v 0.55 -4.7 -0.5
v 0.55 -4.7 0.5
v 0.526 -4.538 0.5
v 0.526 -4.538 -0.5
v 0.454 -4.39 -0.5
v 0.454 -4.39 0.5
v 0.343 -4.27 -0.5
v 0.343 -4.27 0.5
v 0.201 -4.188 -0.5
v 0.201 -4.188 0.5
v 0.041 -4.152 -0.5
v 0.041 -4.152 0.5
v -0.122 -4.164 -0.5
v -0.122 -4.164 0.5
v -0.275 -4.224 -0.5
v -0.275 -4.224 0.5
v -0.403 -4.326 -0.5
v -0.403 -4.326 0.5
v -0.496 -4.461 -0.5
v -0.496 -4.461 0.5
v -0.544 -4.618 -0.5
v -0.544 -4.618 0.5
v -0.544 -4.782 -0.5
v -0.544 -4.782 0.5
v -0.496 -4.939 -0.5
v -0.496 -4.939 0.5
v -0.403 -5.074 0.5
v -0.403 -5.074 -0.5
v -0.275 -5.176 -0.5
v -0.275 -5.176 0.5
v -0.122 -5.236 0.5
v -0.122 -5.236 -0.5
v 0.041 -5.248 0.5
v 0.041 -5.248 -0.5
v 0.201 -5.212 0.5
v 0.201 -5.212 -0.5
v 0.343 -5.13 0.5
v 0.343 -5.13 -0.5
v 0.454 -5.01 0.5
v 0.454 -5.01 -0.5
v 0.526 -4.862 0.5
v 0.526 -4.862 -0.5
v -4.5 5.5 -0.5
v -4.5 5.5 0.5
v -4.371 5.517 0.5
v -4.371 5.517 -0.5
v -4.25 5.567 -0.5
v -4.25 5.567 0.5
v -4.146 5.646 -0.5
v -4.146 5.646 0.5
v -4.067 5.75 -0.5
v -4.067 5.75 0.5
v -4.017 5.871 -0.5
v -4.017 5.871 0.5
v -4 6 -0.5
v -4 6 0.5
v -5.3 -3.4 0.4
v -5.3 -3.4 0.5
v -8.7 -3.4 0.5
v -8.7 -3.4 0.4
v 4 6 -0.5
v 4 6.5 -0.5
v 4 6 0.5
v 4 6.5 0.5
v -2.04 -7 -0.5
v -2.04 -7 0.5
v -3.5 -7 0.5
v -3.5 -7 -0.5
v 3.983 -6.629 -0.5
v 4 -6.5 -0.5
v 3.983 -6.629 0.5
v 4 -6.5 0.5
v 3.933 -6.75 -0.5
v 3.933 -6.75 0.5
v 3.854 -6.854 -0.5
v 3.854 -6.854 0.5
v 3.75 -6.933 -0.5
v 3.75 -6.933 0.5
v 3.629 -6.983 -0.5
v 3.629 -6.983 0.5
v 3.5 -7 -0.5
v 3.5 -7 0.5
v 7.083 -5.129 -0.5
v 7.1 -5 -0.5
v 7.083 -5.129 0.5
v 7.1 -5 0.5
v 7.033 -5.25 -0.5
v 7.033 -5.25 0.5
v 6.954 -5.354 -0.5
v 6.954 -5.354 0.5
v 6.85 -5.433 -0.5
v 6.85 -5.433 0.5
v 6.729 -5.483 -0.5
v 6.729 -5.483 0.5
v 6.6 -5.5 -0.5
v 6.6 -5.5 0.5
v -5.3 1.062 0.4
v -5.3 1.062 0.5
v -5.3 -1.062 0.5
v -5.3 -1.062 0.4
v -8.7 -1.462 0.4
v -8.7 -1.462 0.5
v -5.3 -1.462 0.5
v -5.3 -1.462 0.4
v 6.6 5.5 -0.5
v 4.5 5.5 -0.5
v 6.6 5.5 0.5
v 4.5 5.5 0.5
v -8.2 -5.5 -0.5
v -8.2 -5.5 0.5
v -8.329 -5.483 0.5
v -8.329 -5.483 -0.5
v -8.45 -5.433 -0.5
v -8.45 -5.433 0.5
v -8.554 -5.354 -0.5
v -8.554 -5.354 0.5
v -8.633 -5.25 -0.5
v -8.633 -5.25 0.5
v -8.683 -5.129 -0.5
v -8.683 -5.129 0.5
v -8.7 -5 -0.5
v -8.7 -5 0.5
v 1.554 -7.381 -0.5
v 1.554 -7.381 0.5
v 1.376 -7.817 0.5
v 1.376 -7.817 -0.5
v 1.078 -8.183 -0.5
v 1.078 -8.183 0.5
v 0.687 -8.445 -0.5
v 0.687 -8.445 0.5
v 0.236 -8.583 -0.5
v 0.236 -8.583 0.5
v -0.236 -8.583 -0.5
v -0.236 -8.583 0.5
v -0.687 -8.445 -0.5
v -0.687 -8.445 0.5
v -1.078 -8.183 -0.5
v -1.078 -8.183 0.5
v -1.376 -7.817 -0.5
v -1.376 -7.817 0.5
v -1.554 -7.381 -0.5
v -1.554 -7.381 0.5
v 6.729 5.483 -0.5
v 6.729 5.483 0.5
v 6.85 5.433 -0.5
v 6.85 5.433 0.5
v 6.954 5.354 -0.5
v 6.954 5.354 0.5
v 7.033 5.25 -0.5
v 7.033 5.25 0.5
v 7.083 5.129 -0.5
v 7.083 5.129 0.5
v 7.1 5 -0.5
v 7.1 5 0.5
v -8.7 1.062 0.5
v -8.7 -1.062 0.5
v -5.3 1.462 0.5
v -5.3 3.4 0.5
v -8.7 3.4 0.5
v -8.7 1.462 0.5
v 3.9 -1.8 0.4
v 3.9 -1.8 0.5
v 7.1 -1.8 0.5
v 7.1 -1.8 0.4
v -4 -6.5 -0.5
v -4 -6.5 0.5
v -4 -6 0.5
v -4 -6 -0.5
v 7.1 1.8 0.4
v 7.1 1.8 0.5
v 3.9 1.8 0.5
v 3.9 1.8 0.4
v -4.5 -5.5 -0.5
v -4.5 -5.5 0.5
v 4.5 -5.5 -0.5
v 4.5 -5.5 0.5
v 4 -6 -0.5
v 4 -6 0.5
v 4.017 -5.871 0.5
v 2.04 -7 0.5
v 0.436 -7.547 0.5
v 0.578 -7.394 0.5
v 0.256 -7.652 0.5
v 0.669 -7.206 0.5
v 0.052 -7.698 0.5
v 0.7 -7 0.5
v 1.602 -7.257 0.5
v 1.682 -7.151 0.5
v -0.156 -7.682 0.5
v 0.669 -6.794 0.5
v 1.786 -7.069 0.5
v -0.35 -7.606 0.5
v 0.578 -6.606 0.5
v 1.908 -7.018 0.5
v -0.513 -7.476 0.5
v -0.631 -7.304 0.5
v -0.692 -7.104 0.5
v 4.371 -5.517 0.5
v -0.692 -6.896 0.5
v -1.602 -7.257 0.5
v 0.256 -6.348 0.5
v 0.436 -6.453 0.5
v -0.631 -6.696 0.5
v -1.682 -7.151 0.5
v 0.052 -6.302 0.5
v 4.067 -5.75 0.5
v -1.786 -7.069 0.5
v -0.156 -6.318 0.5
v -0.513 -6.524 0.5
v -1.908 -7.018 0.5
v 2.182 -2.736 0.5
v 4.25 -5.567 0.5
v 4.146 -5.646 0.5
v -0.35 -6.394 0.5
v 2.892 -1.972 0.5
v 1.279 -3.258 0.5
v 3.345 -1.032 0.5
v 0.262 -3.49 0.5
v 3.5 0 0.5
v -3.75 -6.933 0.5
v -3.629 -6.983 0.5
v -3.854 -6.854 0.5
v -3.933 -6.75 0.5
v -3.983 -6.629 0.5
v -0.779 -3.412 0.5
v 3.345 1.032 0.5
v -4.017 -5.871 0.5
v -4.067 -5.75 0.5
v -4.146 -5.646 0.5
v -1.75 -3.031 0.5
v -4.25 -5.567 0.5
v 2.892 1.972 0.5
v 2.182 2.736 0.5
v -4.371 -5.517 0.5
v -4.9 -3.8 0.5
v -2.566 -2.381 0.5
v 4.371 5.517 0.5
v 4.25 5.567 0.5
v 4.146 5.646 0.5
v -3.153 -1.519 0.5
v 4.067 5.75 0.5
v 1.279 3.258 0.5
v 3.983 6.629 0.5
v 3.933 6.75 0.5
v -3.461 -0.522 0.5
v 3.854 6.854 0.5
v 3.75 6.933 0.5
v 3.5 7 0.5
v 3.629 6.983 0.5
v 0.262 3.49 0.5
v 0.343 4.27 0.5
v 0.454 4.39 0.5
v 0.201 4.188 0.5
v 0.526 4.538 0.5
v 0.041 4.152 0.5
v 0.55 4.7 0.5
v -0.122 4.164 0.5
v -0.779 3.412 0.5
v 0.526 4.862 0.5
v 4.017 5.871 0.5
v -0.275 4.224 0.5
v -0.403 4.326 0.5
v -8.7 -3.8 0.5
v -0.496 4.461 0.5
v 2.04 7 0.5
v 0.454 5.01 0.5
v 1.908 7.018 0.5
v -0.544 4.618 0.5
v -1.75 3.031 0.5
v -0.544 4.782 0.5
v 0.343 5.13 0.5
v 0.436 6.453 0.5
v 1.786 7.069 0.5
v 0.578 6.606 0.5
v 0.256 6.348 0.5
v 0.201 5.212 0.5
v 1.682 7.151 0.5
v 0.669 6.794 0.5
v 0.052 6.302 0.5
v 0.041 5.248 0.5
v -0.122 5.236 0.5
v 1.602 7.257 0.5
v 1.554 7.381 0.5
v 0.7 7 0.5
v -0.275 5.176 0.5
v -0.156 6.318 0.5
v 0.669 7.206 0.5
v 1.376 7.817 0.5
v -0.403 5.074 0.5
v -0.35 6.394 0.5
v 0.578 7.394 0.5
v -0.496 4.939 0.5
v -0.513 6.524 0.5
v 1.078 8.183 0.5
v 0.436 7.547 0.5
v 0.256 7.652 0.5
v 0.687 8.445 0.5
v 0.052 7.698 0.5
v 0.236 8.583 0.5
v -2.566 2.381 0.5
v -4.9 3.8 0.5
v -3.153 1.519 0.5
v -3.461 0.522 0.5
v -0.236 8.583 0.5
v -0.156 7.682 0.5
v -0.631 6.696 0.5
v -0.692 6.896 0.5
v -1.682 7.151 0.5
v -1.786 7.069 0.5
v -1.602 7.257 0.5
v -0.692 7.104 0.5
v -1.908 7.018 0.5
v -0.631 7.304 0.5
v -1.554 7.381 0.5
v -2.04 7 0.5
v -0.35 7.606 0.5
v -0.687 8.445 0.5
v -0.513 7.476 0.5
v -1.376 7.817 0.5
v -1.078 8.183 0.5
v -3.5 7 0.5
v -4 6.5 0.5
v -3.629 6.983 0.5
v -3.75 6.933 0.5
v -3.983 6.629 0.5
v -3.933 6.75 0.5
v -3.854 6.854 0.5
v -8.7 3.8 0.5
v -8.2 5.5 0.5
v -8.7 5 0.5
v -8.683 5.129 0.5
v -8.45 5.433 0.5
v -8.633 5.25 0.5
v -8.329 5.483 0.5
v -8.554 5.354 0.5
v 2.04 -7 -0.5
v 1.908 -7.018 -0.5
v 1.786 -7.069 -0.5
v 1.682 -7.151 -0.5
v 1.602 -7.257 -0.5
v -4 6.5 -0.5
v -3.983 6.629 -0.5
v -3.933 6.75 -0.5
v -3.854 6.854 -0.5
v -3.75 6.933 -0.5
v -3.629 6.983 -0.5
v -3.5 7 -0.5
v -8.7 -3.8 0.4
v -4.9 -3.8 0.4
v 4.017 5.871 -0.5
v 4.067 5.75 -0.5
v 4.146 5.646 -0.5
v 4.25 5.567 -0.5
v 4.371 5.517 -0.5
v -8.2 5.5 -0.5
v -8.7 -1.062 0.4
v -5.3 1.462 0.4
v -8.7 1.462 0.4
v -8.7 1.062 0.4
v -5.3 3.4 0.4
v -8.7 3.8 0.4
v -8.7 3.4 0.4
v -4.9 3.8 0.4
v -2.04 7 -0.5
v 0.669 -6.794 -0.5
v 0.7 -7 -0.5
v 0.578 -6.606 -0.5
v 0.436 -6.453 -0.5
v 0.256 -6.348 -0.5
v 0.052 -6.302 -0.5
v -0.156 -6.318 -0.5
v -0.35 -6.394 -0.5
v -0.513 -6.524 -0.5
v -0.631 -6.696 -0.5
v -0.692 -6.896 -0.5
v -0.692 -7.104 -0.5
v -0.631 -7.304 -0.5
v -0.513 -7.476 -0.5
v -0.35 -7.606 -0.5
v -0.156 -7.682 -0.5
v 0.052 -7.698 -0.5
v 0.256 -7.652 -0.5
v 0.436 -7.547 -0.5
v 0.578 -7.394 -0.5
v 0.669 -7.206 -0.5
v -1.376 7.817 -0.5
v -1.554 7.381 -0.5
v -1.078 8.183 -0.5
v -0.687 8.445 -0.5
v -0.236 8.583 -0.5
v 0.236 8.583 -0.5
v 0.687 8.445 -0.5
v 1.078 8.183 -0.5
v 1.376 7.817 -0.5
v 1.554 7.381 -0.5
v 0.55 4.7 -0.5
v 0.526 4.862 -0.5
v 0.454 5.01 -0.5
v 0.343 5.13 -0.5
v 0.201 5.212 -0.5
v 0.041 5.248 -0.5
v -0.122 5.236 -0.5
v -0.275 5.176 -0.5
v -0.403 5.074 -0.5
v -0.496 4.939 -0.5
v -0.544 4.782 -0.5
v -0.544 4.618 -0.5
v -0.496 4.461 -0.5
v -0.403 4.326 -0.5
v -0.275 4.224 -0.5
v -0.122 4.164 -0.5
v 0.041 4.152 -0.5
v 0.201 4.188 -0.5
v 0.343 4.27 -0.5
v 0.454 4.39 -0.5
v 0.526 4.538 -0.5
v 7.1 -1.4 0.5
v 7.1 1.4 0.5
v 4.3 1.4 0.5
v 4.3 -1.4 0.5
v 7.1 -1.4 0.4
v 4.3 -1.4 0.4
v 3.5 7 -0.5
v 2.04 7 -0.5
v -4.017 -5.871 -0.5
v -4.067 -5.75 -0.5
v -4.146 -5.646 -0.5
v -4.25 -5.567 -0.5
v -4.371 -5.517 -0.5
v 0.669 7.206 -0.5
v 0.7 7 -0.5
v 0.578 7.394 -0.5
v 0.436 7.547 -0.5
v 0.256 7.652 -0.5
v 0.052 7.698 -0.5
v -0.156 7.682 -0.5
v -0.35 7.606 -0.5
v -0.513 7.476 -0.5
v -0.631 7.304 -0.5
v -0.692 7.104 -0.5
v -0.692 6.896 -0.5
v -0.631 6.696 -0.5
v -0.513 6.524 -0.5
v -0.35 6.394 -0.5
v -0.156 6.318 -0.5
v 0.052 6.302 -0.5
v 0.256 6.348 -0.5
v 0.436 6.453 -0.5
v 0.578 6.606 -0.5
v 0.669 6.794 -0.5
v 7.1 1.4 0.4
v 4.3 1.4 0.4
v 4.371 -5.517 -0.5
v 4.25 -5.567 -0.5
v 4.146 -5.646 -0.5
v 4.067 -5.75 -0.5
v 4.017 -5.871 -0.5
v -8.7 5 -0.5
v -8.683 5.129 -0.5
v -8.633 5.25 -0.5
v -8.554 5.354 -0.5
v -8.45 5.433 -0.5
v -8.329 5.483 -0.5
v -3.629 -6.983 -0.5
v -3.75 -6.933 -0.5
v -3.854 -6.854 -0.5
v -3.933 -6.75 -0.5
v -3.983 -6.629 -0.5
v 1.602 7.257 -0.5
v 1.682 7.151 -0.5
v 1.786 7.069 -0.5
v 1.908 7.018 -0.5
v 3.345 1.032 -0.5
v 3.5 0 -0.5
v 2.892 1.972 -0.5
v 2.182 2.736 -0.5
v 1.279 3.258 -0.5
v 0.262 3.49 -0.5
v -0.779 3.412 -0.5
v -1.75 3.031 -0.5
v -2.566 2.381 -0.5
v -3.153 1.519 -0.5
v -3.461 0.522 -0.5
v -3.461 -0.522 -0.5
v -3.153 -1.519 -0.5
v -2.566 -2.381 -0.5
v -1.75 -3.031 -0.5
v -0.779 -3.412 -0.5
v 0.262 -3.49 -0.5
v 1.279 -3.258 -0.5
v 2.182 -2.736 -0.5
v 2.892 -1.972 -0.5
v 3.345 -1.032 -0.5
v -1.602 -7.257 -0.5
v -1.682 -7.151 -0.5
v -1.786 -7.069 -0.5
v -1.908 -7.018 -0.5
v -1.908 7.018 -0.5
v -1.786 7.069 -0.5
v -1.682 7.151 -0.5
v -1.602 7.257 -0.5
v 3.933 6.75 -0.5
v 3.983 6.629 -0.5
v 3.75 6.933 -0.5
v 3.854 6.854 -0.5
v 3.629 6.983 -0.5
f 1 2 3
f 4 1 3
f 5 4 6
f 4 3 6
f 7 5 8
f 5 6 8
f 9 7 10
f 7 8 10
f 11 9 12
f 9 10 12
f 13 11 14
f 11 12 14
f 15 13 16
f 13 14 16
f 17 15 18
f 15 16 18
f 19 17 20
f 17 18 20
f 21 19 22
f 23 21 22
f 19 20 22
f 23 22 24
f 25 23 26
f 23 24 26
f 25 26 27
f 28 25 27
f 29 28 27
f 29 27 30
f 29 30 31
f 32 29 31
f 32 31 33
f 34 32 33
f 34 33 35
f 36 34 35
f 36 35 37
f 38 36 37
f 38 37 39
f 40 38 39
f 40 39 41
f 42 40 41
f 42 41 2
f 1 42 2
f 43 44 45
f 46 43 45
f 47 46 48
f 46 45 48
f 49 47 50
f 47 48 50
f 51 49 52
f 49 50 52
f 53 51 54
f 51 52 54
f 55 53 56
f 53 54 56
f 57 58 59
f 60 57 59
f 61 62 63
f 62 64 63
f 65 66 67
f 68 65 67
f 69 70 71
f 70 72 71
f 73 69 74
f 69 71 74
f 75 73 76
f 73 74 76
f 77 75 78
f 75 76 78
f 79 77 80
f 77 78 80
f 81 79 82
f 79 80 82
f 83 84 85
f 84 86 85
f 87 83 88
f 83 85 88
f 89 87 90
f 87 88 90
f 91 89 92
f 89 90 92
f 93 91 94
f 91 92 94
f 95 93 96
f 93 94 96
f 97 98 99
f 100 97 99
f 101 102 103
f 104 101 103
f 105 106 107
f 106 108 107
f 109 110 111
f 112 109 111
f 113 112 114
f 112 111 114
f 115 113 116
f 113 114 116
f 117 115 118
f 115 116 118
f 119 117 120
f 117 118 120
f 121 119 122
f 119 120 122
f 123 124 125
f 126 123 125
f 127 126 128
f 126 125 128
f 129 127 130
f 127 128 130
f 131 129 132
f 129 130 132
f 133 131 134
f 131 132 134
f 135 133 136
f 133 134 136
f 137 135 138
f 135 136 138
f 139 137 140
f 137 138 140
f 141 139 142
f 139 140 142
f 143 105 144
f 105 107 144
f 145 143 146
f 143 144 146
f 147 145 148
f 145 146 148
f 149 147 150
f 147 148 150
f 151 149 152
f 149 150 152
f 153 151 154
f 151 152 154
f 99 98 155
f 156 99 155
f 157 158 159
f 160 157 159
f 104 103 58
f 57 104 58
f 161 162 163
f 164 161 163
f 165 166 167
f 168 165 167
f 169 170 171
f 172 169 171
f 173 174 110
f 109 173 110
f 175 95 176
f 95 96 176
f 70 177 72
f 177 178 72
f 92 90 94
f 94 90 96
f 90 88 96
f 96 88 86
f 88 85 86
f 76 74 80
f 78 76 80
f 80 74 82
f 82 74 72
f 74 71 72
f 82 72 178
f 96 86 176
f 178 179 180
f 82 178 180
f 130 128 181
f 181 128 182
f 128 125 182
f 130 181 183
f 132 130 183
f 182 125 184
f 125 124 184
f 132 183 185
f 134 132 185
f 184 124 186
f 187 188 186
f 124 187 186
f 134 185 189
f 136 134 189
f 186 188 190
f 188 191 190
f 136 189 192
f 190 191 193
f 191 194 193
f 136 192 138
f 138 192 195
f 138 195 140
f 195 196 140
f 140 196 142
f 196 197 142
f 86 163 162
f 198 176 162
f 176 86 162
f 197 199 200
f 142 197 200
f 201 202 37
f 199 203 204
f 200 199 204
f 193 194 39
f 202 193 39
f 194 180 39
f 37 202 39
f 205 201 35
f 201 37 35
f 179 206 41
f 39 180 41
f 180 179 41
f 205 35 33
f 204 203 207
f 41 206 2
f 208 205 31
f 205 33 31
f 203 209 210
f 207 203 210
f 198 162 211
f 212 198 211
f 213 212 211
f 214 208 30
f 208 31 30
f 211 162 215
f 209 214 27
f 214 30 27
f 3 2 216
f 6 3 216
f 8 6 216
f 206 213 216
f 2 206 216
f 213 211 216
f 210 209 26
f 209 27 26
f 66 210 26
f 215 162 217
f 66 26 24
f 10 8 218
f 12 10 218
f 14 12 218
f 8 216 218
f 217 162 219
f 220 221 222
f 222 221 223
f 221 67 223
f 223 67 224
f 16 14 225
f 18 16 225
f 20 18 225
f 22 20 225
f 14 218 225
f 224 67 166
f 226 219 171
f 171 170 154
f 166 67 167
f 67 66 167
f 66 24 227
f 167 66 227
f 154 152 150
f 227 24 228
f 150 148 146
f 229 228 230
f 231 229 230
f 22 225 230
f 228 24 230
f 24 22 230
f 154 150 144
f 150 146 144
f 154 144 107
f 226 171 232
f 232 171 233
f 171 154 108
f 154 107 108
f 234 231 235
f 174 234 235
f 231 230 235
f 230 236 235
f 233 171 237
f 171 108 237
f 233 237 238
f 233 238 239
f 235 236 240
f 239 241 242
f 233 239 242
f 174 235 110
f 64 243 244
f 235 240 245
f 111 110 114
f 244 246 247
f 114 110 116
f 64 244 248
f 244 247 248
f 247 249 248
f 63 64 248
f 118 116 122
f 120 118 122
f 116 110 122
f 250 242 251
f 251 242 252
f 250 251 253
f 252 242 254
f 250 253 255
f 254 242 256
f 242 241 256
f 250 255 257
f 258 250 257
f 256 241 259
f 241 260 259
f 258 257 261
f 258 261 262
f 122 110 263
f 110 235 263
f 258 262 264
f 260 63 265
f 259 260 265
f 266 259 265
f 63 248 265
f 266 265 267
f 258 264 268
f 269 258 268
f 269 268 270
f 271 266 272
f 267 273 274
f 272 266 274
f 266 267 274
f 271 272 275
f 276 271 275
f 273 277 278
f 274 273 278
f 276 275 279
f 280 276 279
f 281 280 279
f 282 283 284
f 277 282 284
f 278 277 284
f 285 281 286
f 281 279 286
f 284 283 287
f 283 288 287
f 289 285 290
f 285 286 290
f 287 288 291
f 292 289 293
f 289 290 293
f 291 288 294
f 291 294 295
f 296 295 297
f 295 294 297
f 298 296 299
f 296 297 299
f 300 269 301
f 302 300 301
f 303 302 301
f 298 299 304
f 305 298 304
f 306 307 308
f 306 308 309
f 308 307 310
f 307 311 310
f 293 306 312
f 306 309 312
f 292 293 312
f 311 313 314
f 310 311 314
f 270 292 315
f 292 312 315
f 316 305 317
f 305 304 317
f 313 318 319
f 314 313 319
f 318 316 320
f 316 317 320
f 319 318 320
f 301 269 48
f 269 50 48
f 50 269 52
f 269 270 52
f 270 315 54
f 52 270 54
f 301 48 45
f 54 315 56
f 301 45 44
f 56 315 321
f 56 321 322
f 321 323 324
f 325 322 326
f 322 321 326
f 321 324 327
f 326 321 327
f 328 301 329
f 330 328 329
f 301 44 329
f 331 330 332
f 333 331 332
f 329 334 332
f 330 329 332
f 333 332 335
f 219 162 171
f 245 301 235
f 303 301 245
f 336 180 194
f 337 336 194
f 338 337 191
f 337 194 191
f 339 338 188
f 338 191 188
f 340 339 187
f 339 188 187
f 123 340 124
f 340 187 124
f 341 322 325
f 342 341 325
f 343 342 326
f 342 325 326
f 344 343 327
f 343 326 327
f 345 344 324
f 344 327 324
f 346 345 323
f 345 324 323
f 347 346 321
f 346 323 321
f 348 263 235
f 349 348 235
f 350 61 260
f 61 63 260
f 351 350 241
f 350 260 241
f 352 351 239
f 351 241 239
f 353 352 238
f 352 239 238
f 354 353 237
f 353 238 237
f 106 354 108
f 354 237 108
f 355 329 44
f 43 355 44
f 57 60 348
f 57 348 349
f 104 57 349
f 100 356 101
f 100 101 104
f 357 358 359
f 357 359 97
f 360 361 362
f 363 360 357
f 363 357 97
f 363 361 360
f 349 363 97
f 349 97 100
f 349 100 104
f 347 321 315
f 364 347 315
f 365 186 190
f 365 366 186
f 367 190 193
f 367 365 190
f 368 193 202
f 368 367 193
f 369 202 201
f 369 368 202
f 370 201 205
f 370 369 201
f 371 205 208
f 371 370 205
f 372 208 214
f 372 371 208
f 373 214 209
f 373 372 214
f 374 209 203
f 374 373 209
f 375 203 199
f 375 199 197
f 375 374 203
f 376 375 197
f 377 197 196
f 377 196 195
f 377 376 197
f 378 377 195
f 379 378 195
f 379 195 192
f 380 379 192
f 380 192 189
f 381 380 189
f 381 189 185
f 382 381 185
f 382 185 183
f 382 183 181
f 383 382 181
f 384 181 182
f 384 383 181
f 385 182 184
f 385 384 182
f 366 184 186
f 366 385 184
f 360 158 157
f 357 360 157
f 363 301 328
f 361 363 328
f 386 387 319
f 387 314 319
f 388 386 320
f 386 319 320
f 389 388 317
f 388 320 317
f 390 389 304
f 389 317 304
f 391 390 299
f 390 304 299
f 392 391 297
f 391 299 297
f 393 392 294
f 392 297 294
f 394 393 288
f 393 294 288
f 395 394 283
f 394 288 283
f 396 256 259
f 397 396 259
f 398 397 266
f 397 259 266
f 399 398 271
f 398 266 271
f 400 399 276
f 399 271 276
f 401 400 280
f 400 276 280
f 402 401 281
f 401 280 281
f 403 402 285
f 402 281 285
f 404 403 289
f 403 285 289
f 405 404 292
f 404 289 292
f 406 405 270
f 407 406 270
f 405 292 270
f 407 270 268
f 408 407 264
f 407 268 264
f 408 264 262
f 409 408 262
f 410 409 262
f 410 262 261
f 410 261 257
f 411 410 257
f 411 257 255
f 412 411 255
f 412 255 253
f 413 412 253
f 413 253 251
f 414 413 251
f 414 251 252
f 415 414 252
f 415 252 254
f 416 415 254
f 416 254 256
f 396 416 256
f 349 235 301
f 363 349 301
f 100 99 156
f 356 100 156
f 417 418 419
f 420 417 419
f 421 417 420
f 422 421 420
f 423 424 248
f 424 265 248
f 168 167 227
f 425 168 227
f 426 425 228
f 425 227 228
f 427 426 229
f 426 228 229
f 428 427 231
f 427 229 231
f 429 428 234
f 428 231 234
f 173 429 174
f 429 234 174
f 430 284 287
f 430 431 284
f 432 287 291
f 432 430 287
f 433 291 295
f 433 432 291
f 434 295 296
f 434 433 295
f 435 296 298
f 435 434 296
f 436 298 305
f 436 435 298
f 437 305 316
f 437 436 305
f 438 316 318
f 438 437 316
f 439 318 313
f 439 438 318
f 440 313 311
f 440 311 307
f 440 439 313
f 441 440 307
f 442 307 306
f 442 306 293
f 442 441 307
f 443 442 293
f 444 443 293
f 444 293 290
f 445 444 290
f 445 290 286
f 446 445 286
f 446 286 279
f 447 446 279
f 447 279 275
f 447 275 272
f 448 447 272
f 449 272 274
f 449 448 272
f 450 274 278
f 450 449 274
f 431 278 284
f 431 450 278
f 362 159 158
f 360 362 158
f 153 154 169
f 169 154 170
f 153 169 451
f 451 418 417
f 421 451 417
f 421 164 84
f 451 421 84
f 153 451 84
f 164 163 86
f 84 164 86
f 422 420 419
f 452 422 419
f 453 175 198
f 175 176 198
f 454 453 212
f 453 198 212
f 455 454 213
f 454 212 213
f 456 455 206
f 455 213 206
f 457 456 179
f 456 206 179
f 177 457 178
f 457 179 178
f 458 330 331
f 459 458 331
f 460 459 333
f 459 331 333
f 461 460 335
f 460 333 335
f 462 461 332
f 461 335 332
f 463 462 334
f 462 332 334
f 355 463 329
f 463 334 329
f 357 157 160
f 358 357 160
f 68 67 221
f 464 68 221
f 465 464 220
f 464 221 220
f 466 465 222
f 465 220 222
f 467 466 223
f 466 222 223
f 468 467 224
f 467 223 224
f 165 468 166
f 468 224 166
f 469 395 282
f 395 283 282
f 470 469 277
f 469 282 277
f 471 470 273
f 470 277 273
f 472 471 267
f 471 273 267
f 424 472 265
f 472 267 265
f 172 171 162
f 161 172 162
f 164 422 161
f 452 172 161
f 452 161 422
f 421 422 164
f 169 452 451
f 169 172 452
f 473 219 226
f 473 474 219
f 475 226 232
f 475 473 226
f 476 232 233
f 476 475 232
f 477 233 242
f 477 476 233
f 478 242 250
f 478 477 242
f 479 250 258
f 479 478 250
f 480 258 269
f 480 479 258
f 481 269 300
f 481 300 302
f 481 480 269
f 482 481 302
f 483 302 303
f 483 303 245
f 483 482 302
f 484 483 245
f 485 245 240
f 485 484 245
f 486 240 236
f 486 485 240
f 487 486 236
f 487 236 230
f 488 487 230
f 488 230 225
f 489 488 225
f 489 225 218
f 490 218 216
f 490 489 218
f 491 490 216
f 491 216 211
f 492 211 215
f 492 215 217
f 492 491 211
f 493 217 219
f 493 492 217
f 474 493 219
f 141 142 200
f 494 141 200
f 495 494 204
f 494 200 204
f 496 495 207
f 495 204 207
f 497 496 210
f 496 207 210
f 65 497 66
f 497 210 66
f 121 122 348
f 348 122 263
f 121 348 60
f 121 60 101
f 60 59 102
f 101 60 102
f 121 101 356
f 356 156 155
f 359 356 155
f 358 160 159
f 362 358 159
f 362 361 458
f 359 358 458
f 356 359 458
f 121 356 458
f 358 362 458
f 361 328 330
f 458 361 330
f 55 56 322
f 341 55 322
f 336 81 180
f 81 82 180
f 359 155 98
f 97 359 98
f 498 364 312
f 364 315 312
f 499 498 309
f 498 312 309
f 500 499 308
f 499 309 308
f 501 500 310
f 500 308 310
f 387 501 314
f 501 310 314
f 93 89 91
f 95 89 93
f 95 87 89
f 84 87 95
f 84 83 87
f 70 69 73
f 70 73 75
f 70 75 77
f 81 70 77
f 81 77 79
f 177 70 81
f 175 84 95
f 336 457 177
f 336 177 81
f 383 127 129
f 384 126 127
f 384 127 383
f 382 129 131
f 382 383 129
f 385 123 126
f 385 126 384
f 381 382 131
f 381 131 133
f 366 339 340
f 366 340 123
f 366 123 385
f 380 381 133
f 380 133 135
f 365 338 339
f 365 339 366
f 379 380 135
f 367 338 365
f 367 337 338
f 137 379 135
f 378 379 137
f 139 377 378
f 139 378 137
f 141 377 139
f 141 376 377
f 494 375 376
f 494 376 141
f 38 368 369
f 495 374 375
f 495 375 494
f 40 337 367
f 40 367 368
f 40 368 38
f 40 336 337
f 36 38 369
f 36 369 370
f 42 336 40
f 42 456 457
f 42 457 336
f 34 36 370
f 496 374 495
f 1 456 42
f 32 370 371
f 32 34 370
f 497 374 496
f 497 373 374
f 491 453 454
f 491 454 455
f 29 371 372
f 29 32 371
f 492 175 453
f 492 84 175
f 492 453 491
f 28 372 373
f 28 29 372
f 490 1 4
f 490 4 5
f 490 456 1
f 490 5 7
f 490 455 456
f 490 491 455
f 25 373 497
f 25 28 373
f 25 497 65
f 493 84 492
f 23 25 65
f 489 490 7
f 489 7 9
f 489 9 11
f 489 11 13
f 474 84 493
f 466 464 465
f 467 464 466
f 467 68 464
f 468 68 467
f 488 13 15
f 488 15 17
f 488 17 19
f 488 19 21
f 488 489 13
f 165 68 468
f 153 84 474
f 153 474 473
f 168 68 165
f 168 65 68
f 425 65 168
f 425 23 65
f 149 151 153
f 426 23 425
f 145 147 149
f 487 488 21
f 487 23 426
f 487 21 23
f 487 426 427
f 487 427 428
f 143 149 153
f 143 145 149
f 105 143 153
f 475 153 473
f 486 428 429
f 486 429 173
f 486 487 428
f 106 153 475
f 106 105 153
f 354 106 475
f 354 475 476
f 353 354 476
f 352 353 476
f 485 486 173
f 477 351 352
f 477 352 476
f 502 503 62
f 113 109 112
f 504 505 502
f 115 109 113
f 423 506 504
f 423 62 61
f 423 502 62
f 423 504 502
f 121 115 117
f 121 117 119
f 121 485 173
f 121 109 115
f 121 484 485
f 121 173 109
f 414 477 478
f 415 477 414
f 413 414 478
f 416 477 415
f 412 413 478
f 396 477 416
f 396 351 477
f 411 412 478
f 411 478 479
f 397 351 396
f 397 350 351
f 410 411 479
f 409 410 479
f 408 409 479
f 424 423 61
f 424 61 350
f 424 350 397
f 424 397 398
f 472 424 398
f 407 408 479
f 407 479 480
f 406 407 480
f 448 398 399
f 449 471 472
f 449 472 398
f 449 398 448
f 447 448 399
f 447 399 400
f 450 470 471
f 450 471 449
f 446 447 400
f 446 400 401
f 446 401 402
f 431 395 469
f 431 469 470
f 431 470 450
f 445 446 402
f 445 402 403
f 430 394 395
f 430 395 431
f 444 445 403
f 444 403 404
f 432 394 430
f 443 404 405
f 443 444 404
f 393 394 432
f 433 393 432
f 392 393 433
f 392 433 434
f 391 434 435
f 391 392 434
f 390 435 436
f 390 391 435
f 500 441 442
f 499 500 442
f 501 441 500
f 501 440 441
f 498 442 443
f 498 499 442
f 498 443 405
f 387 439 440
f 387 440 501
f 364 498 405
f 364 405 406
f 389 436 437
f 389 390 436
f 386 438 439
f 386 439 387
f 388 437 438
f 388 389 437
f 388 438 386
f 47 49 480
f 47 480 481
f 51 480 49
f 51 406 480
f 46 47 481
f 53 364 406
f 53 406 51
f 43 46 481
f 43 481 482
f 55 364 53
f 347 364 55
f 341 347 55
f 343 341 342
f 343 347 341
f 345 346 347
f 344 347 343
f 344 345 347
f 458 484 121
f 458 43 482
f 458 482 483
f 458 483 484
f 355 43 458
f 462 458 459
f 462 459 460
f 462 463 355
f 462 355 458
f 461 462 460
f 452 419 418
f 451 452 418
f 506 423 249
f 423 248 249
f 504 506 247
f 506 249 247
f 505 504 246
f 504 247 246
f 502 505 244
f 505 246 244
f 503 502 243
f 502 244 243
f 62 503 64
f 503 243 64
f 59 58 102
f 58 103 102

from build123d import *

# Parameters (mm, degrees)
MODEL_R         = 3.5
MODEL_R_2       = 0.7
EXTRUDE_1_DEPTH = 0.5
EXTRUDE2_DEPTH  = 0.1
SKETCH3_R       = 0.55
EXTRUDE3_DEPTH  = 13.273956167


with BuildPart() as part:
    # Model → Бобышка-Вытянуть1 (new, symmetric)
    with BuildSketch(Plane.XY):
        with BuildLine():
            Line((-3.5, 7), (-2.039607805, 7))
            ThreePointArc((-2.039607805, 7), (-1.731001106, 7.106602104), (-1.553986899, 7.380952381))
            ThreePointArc((-1.553986899, 7.380952381), (0, 8.6), (1.553986899, 7.380952381))
            ThreePointArc((1.553986899, 7.380952381), (1.731001106, 7.106602104), (2.039607805, 7))
            Line((2.039607805, 7), (3.5, 7))
            ThreePointArc((3.5, 7), (3.853553391, 6.853553391), (4, 6.5))
            Line((4, 6.5), (4, 6))
            ThreePointArc((4, 6), (4.146446609, 5.646446609), (4.5, 5.5))
            Line((4.5, 5.5), (6.6, 5.5))
            ThreePointArc((6.6, 5.5), (6.953553391, 5.353553391), (7.1, 5))
            Line((7.1, 5), (7.1, -5))
            ThreePointArc((7.1, -5), (6.953553391, -5.353553391), (6.6, -5.5))
            Line((6.6, -5.5), (4.5, -5.5))
            ThreePointArc((4.5, -5.5), (4.146446609, -5.646446609), (4, -6))
            Line((4, -6), (4, -6.5))
            ThreePointArc((4, -6.5), (3.853553391, -6.853553391), (3.5, -7))
            Line((3.5, -7), (2.039607805, -7))
            ThreePointArc((2.039607805, -7), (1.731001106, -7.106602104), (1.553986899, -7.380952381))
            ThreePointArc((1.553986899, -7.380952381), (0, -8.6), (-1.553986899, -7.380952381))
            ThreePointArc((-1.553986899, -7.380952381), (-1.731001106, -7.106602104), (-2.039607805, -7))
            Line((-2.039607805, -7), (-3.5, -7))
            ThreePointArc((-3.5, -7), (-3.853553391, -6.853553391), (-4, -6.5))
            Line((-4, -6.5), (-4, -6))
            ThreePointArc((-4, -6), (-4.146446609, -5.646446609), (-4.5, -5.5))
            Line((-4.5, -5.5), (-8.2, -5.5))
            ThreePointArc((-8.2, -5.5), (-8.553553391, -5.353553391), (-8.7, -5))
            Line((-8.7, -5), (-8.7, 5))
            ThreePointArc((-8.7, 5), (-8.553553391, 5.353553391), (-8.2, 5.5))
            Line((-8.2, 5.5), (-4.5, 5.5))
            ThreePointArc((-4.5, 5.5), (-4.146446609, 5.646446609), (-4, 6))
            Line((-4, 6), (-4, 6.5))
            ThreePointArc((-4, 6.5), (-3.853553391, 6.853553391), (-3.5, 7))
        make_face()
        Circle(MODEL_R, mode=Mode.SUBTRACT)
        with Locations((0, 7)):
            Circle(MODEL_R_2, mode=Mode.SUBTRACT)
        with Locations((0, -7)):
            Circle(MODEL_R_2, mode=Mode.SUBTRACT)
    extrude(amount=EXTRUDE_1_DEPTH, both=True)

    # Sketch2 → Extrude2 (cut)
    with BuildSketch(Plane.XY.offset(0.5)):
        Polygon((-9.557418436, -3.8), (-4.9, -3.8), (-4.9, 3.8), (-9.557418436, 3.8), (-9.557418436, 3.4), (-5.3, 3.4), (-5.3, 1.462476295), (-9.557418436, 1.462476295), (-9.557418436, 1.062476295), (-5.3, 1.062476295), (-5.3, -1.062476295), (-9.557418436, -1.062476295), (-9.557418436, -1.462476295), (-5.3, -1.462476295), (-5.3, -3.4), (-9.557418436, -3.4), align=None)
        Polygon((7.739654587, -1.8), (7.739654587, -1.4), (4.3, -1.4), (4.3, 1.4), (7.739654587, 1.4), (7.739654587, 1.8), (3.9, 1.8), (3.9, -1.8), align=None)
    extrude(amount=-EXTRUDE2_DEPTH, mode=Mode.SUBTRACT)

    # Sketch3 → Extrude3 (cut, through all)
    with BuildSketch(Plane.XY.offset(0.5)):
        with Locations((0, 4.7)):
            Circle(SKETCH3_R)
        with Locations((0, -4.7)):
            Circle(SKETCH3_R)
    extrude(amount=-EXTRUDE3_DEPTH, mode=Mode.SUBTRACT)


solid = part.part
